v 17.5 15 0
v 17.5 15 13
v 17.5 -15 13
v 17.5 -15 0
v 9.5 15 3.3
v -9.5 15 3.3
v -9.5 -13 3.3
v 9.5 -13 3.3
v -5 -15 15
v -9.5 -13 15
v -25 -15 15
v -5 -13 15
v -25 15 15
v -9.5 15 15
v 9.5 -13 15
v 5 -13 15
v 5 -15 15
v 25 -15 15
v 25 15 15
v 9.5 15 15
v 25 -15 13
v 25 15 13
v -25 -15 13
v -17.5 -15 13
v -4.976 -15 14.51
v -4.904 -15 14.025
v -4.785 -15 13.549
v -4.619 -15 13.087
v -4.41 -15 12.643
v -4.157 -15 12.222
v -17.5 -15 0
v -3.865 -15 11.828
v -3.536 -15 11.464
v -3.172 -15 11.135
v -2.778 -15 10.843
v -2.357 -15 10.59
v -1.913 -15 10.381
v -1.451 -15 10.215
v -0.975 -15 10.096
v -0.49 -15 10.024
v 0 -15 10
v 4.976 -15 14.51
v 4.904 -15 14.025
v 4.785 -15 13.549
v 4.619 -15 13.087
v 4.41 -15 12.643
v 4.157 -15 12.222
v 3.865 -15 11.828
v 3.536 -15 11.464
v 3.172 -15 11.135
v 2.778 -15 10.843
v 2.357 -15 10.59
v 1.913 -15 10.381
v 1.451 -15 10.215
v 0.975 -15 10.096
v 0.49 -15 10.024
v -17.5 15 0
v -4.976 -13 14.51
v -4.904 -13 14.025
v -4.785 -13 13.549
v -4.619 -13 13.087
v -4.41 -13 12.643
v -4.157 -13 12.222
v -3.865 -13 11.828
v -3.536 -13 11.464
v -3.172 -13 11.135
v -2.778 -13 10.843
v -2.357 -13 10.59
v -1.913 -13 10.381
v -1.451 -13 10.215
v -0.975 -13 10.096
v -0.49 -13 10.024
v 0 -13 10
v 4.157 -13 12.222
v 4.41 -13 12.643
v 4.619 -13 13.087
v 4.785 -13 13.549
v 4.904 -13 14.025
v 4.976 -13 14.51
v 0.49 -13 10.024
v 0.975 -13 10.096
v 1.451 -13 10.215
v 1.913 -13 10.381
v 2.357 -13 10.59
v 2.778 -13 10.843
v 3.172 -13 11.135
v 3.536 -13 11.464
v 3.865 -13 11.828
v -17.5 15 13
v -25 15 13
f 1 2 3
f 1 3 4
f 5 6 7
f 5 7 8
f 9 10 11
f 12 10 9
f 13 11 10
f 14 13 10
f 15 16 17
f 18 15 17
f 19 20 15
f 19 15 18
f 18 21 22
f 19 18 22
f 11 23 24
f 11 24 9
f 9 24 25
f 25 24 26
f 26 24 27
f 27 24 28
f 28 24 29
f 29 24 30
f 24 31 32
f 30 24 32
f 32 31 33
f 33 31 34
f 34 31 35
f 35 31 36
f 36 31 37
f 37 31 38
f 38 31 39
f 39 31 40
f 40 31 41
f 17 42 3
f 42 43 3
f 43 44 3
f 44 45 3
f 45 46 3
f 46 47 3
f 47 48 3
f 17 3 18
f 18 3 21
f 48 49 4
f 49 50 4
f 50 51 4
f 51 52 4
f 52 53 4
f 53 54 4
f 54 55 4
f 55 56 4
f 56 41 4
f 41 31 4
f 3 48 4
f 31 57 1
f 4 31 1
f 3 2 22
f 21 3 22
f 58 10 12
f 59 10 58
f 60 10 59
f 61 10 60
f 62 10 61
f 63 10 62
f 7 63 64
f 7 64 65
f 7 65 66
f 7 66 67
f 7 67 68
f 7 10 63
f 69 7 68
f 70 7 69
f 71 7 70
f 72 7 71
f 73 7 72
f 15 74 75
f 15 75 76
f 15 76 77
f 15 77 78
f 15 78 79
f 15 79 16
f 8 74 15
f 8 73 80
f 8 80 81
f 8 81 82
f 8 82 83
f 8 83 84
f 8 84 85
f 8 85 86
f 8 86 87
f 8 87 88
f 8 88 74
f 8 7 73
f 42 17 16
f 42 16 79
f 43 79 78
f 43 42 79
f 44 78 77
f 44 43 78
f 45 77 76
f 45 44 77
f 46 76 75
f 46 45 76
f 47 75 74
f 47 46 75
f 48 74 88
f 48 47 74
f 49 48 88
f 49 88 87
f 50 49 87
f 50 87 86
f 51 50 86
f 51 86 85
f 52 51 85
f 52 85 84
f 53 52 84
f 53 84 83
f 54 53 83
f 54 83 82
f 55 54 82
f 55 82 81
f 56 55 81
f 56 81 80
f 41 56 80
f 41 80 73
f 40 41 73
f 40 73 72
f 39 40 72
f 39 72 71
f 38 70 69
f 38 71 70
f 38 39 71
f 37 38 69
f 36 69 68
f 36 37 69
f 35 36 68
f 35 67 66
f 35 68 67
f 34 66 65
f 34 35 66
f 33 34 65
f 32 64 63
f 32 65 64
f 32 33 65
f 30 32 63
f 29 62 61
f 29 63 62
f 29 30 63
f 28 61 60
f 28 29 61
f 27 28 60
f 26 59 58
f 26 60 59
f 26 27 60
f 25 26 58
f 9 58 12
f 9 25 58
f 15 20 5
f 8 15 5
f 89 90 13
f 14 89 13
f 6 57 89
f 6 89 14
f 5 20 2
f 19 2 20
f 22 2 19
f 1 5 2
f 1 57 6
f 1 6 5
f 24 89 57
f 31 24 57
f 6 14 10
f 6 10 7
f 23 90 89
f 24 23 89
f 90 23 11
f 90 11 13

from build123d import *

# Parameters (mm, degrees)
SKETCH_1_W          = 50
SKETCH_1_H          = 30
EXTRUDE_1_DEPTH     = 15
SKETCH_2_W          = 19
SKETCH_2_H          = 11.7
CUT_EXTRUDE_1_DEPTH = 28
SKETCH_4_W          = 7.5
SKETCH_4_H          = 13
CUT_EXTRUDE_3_DEPTH = 50
SKETCH_5_W          = 7.5
SKETCH_5_H          = 13
CUT_EXTRUDE_4_DEPTH = 50
CUT_EXTRUDE_5_DEPTH = 50


with BuildPart() as part:
    # Эскиз1 → Бобышка-Вытянуть1 (new body)
    with BuildSketch(Plane.XY):
        Rectangle(SKETCH_1_W, SKETCH_1_H)
    extrude(amount=EXTRUDE_1_DEPTH)

    # Эскиз2 → Вырез-Вытянуть1 (cut)
    with BuildSketch(Plane(origin=(0, 15, 0), x_dir=(1, 0, 0), z_dir=(0, 1, 0))):
        with Locations((0, -9.15)):
            Rectangle(SKETCH_2_W, SKETCH_2_H)
    extrude(amount=-CUT_EXTRUDE_1_DEPTH, mode=Mode.SUBTRACT)

    # Эскиз4 → Вырез-Вытянуть3 (cut)
    with BuildSketch(Plane(origin=(0, 15, 0), x_dir=(1, 0, 0), z_dir=(0, 1, 0))):
        with Locations((-21.25, -6.5)):
            Rectangle(SKETCH_4_W, SKETCH_4_H)
    extrude(amount=-CUT_EXTRUDE_3_DEPTH, mode=Mode.SUBTRACT)

    # Эскиз5 → Вырез-Вытянуть4 (cut)
    with BuildSketch(Plane(origin=(0, 15, 0), x_dir=(1, 0, 0), z_dir=(0, 1, 0))):
        with Locations((21.25, -6.5)):
            Rectangle(SKETCH_5_W, SKETCH_5_H)
    extrude(amount=-CUT_EXTRUDE_4_DEPTH, mode=Mode.SUBTRACT)

    # Эскиз6 → Вырез-Вытянуть5 (cut)
    with BuildSketch(Plane.XZ.offset(15)):
        with BuildLine():
            Line((-5, 15), (5, 15))
            ThreePointArc((5, 15), (0, 10), (-5, 15))
        make_face()
    extrude(amount=-CUT_EXTRUDE_5_DEPTH, mode=Mode.SUBTRACT)


solid = part.part
